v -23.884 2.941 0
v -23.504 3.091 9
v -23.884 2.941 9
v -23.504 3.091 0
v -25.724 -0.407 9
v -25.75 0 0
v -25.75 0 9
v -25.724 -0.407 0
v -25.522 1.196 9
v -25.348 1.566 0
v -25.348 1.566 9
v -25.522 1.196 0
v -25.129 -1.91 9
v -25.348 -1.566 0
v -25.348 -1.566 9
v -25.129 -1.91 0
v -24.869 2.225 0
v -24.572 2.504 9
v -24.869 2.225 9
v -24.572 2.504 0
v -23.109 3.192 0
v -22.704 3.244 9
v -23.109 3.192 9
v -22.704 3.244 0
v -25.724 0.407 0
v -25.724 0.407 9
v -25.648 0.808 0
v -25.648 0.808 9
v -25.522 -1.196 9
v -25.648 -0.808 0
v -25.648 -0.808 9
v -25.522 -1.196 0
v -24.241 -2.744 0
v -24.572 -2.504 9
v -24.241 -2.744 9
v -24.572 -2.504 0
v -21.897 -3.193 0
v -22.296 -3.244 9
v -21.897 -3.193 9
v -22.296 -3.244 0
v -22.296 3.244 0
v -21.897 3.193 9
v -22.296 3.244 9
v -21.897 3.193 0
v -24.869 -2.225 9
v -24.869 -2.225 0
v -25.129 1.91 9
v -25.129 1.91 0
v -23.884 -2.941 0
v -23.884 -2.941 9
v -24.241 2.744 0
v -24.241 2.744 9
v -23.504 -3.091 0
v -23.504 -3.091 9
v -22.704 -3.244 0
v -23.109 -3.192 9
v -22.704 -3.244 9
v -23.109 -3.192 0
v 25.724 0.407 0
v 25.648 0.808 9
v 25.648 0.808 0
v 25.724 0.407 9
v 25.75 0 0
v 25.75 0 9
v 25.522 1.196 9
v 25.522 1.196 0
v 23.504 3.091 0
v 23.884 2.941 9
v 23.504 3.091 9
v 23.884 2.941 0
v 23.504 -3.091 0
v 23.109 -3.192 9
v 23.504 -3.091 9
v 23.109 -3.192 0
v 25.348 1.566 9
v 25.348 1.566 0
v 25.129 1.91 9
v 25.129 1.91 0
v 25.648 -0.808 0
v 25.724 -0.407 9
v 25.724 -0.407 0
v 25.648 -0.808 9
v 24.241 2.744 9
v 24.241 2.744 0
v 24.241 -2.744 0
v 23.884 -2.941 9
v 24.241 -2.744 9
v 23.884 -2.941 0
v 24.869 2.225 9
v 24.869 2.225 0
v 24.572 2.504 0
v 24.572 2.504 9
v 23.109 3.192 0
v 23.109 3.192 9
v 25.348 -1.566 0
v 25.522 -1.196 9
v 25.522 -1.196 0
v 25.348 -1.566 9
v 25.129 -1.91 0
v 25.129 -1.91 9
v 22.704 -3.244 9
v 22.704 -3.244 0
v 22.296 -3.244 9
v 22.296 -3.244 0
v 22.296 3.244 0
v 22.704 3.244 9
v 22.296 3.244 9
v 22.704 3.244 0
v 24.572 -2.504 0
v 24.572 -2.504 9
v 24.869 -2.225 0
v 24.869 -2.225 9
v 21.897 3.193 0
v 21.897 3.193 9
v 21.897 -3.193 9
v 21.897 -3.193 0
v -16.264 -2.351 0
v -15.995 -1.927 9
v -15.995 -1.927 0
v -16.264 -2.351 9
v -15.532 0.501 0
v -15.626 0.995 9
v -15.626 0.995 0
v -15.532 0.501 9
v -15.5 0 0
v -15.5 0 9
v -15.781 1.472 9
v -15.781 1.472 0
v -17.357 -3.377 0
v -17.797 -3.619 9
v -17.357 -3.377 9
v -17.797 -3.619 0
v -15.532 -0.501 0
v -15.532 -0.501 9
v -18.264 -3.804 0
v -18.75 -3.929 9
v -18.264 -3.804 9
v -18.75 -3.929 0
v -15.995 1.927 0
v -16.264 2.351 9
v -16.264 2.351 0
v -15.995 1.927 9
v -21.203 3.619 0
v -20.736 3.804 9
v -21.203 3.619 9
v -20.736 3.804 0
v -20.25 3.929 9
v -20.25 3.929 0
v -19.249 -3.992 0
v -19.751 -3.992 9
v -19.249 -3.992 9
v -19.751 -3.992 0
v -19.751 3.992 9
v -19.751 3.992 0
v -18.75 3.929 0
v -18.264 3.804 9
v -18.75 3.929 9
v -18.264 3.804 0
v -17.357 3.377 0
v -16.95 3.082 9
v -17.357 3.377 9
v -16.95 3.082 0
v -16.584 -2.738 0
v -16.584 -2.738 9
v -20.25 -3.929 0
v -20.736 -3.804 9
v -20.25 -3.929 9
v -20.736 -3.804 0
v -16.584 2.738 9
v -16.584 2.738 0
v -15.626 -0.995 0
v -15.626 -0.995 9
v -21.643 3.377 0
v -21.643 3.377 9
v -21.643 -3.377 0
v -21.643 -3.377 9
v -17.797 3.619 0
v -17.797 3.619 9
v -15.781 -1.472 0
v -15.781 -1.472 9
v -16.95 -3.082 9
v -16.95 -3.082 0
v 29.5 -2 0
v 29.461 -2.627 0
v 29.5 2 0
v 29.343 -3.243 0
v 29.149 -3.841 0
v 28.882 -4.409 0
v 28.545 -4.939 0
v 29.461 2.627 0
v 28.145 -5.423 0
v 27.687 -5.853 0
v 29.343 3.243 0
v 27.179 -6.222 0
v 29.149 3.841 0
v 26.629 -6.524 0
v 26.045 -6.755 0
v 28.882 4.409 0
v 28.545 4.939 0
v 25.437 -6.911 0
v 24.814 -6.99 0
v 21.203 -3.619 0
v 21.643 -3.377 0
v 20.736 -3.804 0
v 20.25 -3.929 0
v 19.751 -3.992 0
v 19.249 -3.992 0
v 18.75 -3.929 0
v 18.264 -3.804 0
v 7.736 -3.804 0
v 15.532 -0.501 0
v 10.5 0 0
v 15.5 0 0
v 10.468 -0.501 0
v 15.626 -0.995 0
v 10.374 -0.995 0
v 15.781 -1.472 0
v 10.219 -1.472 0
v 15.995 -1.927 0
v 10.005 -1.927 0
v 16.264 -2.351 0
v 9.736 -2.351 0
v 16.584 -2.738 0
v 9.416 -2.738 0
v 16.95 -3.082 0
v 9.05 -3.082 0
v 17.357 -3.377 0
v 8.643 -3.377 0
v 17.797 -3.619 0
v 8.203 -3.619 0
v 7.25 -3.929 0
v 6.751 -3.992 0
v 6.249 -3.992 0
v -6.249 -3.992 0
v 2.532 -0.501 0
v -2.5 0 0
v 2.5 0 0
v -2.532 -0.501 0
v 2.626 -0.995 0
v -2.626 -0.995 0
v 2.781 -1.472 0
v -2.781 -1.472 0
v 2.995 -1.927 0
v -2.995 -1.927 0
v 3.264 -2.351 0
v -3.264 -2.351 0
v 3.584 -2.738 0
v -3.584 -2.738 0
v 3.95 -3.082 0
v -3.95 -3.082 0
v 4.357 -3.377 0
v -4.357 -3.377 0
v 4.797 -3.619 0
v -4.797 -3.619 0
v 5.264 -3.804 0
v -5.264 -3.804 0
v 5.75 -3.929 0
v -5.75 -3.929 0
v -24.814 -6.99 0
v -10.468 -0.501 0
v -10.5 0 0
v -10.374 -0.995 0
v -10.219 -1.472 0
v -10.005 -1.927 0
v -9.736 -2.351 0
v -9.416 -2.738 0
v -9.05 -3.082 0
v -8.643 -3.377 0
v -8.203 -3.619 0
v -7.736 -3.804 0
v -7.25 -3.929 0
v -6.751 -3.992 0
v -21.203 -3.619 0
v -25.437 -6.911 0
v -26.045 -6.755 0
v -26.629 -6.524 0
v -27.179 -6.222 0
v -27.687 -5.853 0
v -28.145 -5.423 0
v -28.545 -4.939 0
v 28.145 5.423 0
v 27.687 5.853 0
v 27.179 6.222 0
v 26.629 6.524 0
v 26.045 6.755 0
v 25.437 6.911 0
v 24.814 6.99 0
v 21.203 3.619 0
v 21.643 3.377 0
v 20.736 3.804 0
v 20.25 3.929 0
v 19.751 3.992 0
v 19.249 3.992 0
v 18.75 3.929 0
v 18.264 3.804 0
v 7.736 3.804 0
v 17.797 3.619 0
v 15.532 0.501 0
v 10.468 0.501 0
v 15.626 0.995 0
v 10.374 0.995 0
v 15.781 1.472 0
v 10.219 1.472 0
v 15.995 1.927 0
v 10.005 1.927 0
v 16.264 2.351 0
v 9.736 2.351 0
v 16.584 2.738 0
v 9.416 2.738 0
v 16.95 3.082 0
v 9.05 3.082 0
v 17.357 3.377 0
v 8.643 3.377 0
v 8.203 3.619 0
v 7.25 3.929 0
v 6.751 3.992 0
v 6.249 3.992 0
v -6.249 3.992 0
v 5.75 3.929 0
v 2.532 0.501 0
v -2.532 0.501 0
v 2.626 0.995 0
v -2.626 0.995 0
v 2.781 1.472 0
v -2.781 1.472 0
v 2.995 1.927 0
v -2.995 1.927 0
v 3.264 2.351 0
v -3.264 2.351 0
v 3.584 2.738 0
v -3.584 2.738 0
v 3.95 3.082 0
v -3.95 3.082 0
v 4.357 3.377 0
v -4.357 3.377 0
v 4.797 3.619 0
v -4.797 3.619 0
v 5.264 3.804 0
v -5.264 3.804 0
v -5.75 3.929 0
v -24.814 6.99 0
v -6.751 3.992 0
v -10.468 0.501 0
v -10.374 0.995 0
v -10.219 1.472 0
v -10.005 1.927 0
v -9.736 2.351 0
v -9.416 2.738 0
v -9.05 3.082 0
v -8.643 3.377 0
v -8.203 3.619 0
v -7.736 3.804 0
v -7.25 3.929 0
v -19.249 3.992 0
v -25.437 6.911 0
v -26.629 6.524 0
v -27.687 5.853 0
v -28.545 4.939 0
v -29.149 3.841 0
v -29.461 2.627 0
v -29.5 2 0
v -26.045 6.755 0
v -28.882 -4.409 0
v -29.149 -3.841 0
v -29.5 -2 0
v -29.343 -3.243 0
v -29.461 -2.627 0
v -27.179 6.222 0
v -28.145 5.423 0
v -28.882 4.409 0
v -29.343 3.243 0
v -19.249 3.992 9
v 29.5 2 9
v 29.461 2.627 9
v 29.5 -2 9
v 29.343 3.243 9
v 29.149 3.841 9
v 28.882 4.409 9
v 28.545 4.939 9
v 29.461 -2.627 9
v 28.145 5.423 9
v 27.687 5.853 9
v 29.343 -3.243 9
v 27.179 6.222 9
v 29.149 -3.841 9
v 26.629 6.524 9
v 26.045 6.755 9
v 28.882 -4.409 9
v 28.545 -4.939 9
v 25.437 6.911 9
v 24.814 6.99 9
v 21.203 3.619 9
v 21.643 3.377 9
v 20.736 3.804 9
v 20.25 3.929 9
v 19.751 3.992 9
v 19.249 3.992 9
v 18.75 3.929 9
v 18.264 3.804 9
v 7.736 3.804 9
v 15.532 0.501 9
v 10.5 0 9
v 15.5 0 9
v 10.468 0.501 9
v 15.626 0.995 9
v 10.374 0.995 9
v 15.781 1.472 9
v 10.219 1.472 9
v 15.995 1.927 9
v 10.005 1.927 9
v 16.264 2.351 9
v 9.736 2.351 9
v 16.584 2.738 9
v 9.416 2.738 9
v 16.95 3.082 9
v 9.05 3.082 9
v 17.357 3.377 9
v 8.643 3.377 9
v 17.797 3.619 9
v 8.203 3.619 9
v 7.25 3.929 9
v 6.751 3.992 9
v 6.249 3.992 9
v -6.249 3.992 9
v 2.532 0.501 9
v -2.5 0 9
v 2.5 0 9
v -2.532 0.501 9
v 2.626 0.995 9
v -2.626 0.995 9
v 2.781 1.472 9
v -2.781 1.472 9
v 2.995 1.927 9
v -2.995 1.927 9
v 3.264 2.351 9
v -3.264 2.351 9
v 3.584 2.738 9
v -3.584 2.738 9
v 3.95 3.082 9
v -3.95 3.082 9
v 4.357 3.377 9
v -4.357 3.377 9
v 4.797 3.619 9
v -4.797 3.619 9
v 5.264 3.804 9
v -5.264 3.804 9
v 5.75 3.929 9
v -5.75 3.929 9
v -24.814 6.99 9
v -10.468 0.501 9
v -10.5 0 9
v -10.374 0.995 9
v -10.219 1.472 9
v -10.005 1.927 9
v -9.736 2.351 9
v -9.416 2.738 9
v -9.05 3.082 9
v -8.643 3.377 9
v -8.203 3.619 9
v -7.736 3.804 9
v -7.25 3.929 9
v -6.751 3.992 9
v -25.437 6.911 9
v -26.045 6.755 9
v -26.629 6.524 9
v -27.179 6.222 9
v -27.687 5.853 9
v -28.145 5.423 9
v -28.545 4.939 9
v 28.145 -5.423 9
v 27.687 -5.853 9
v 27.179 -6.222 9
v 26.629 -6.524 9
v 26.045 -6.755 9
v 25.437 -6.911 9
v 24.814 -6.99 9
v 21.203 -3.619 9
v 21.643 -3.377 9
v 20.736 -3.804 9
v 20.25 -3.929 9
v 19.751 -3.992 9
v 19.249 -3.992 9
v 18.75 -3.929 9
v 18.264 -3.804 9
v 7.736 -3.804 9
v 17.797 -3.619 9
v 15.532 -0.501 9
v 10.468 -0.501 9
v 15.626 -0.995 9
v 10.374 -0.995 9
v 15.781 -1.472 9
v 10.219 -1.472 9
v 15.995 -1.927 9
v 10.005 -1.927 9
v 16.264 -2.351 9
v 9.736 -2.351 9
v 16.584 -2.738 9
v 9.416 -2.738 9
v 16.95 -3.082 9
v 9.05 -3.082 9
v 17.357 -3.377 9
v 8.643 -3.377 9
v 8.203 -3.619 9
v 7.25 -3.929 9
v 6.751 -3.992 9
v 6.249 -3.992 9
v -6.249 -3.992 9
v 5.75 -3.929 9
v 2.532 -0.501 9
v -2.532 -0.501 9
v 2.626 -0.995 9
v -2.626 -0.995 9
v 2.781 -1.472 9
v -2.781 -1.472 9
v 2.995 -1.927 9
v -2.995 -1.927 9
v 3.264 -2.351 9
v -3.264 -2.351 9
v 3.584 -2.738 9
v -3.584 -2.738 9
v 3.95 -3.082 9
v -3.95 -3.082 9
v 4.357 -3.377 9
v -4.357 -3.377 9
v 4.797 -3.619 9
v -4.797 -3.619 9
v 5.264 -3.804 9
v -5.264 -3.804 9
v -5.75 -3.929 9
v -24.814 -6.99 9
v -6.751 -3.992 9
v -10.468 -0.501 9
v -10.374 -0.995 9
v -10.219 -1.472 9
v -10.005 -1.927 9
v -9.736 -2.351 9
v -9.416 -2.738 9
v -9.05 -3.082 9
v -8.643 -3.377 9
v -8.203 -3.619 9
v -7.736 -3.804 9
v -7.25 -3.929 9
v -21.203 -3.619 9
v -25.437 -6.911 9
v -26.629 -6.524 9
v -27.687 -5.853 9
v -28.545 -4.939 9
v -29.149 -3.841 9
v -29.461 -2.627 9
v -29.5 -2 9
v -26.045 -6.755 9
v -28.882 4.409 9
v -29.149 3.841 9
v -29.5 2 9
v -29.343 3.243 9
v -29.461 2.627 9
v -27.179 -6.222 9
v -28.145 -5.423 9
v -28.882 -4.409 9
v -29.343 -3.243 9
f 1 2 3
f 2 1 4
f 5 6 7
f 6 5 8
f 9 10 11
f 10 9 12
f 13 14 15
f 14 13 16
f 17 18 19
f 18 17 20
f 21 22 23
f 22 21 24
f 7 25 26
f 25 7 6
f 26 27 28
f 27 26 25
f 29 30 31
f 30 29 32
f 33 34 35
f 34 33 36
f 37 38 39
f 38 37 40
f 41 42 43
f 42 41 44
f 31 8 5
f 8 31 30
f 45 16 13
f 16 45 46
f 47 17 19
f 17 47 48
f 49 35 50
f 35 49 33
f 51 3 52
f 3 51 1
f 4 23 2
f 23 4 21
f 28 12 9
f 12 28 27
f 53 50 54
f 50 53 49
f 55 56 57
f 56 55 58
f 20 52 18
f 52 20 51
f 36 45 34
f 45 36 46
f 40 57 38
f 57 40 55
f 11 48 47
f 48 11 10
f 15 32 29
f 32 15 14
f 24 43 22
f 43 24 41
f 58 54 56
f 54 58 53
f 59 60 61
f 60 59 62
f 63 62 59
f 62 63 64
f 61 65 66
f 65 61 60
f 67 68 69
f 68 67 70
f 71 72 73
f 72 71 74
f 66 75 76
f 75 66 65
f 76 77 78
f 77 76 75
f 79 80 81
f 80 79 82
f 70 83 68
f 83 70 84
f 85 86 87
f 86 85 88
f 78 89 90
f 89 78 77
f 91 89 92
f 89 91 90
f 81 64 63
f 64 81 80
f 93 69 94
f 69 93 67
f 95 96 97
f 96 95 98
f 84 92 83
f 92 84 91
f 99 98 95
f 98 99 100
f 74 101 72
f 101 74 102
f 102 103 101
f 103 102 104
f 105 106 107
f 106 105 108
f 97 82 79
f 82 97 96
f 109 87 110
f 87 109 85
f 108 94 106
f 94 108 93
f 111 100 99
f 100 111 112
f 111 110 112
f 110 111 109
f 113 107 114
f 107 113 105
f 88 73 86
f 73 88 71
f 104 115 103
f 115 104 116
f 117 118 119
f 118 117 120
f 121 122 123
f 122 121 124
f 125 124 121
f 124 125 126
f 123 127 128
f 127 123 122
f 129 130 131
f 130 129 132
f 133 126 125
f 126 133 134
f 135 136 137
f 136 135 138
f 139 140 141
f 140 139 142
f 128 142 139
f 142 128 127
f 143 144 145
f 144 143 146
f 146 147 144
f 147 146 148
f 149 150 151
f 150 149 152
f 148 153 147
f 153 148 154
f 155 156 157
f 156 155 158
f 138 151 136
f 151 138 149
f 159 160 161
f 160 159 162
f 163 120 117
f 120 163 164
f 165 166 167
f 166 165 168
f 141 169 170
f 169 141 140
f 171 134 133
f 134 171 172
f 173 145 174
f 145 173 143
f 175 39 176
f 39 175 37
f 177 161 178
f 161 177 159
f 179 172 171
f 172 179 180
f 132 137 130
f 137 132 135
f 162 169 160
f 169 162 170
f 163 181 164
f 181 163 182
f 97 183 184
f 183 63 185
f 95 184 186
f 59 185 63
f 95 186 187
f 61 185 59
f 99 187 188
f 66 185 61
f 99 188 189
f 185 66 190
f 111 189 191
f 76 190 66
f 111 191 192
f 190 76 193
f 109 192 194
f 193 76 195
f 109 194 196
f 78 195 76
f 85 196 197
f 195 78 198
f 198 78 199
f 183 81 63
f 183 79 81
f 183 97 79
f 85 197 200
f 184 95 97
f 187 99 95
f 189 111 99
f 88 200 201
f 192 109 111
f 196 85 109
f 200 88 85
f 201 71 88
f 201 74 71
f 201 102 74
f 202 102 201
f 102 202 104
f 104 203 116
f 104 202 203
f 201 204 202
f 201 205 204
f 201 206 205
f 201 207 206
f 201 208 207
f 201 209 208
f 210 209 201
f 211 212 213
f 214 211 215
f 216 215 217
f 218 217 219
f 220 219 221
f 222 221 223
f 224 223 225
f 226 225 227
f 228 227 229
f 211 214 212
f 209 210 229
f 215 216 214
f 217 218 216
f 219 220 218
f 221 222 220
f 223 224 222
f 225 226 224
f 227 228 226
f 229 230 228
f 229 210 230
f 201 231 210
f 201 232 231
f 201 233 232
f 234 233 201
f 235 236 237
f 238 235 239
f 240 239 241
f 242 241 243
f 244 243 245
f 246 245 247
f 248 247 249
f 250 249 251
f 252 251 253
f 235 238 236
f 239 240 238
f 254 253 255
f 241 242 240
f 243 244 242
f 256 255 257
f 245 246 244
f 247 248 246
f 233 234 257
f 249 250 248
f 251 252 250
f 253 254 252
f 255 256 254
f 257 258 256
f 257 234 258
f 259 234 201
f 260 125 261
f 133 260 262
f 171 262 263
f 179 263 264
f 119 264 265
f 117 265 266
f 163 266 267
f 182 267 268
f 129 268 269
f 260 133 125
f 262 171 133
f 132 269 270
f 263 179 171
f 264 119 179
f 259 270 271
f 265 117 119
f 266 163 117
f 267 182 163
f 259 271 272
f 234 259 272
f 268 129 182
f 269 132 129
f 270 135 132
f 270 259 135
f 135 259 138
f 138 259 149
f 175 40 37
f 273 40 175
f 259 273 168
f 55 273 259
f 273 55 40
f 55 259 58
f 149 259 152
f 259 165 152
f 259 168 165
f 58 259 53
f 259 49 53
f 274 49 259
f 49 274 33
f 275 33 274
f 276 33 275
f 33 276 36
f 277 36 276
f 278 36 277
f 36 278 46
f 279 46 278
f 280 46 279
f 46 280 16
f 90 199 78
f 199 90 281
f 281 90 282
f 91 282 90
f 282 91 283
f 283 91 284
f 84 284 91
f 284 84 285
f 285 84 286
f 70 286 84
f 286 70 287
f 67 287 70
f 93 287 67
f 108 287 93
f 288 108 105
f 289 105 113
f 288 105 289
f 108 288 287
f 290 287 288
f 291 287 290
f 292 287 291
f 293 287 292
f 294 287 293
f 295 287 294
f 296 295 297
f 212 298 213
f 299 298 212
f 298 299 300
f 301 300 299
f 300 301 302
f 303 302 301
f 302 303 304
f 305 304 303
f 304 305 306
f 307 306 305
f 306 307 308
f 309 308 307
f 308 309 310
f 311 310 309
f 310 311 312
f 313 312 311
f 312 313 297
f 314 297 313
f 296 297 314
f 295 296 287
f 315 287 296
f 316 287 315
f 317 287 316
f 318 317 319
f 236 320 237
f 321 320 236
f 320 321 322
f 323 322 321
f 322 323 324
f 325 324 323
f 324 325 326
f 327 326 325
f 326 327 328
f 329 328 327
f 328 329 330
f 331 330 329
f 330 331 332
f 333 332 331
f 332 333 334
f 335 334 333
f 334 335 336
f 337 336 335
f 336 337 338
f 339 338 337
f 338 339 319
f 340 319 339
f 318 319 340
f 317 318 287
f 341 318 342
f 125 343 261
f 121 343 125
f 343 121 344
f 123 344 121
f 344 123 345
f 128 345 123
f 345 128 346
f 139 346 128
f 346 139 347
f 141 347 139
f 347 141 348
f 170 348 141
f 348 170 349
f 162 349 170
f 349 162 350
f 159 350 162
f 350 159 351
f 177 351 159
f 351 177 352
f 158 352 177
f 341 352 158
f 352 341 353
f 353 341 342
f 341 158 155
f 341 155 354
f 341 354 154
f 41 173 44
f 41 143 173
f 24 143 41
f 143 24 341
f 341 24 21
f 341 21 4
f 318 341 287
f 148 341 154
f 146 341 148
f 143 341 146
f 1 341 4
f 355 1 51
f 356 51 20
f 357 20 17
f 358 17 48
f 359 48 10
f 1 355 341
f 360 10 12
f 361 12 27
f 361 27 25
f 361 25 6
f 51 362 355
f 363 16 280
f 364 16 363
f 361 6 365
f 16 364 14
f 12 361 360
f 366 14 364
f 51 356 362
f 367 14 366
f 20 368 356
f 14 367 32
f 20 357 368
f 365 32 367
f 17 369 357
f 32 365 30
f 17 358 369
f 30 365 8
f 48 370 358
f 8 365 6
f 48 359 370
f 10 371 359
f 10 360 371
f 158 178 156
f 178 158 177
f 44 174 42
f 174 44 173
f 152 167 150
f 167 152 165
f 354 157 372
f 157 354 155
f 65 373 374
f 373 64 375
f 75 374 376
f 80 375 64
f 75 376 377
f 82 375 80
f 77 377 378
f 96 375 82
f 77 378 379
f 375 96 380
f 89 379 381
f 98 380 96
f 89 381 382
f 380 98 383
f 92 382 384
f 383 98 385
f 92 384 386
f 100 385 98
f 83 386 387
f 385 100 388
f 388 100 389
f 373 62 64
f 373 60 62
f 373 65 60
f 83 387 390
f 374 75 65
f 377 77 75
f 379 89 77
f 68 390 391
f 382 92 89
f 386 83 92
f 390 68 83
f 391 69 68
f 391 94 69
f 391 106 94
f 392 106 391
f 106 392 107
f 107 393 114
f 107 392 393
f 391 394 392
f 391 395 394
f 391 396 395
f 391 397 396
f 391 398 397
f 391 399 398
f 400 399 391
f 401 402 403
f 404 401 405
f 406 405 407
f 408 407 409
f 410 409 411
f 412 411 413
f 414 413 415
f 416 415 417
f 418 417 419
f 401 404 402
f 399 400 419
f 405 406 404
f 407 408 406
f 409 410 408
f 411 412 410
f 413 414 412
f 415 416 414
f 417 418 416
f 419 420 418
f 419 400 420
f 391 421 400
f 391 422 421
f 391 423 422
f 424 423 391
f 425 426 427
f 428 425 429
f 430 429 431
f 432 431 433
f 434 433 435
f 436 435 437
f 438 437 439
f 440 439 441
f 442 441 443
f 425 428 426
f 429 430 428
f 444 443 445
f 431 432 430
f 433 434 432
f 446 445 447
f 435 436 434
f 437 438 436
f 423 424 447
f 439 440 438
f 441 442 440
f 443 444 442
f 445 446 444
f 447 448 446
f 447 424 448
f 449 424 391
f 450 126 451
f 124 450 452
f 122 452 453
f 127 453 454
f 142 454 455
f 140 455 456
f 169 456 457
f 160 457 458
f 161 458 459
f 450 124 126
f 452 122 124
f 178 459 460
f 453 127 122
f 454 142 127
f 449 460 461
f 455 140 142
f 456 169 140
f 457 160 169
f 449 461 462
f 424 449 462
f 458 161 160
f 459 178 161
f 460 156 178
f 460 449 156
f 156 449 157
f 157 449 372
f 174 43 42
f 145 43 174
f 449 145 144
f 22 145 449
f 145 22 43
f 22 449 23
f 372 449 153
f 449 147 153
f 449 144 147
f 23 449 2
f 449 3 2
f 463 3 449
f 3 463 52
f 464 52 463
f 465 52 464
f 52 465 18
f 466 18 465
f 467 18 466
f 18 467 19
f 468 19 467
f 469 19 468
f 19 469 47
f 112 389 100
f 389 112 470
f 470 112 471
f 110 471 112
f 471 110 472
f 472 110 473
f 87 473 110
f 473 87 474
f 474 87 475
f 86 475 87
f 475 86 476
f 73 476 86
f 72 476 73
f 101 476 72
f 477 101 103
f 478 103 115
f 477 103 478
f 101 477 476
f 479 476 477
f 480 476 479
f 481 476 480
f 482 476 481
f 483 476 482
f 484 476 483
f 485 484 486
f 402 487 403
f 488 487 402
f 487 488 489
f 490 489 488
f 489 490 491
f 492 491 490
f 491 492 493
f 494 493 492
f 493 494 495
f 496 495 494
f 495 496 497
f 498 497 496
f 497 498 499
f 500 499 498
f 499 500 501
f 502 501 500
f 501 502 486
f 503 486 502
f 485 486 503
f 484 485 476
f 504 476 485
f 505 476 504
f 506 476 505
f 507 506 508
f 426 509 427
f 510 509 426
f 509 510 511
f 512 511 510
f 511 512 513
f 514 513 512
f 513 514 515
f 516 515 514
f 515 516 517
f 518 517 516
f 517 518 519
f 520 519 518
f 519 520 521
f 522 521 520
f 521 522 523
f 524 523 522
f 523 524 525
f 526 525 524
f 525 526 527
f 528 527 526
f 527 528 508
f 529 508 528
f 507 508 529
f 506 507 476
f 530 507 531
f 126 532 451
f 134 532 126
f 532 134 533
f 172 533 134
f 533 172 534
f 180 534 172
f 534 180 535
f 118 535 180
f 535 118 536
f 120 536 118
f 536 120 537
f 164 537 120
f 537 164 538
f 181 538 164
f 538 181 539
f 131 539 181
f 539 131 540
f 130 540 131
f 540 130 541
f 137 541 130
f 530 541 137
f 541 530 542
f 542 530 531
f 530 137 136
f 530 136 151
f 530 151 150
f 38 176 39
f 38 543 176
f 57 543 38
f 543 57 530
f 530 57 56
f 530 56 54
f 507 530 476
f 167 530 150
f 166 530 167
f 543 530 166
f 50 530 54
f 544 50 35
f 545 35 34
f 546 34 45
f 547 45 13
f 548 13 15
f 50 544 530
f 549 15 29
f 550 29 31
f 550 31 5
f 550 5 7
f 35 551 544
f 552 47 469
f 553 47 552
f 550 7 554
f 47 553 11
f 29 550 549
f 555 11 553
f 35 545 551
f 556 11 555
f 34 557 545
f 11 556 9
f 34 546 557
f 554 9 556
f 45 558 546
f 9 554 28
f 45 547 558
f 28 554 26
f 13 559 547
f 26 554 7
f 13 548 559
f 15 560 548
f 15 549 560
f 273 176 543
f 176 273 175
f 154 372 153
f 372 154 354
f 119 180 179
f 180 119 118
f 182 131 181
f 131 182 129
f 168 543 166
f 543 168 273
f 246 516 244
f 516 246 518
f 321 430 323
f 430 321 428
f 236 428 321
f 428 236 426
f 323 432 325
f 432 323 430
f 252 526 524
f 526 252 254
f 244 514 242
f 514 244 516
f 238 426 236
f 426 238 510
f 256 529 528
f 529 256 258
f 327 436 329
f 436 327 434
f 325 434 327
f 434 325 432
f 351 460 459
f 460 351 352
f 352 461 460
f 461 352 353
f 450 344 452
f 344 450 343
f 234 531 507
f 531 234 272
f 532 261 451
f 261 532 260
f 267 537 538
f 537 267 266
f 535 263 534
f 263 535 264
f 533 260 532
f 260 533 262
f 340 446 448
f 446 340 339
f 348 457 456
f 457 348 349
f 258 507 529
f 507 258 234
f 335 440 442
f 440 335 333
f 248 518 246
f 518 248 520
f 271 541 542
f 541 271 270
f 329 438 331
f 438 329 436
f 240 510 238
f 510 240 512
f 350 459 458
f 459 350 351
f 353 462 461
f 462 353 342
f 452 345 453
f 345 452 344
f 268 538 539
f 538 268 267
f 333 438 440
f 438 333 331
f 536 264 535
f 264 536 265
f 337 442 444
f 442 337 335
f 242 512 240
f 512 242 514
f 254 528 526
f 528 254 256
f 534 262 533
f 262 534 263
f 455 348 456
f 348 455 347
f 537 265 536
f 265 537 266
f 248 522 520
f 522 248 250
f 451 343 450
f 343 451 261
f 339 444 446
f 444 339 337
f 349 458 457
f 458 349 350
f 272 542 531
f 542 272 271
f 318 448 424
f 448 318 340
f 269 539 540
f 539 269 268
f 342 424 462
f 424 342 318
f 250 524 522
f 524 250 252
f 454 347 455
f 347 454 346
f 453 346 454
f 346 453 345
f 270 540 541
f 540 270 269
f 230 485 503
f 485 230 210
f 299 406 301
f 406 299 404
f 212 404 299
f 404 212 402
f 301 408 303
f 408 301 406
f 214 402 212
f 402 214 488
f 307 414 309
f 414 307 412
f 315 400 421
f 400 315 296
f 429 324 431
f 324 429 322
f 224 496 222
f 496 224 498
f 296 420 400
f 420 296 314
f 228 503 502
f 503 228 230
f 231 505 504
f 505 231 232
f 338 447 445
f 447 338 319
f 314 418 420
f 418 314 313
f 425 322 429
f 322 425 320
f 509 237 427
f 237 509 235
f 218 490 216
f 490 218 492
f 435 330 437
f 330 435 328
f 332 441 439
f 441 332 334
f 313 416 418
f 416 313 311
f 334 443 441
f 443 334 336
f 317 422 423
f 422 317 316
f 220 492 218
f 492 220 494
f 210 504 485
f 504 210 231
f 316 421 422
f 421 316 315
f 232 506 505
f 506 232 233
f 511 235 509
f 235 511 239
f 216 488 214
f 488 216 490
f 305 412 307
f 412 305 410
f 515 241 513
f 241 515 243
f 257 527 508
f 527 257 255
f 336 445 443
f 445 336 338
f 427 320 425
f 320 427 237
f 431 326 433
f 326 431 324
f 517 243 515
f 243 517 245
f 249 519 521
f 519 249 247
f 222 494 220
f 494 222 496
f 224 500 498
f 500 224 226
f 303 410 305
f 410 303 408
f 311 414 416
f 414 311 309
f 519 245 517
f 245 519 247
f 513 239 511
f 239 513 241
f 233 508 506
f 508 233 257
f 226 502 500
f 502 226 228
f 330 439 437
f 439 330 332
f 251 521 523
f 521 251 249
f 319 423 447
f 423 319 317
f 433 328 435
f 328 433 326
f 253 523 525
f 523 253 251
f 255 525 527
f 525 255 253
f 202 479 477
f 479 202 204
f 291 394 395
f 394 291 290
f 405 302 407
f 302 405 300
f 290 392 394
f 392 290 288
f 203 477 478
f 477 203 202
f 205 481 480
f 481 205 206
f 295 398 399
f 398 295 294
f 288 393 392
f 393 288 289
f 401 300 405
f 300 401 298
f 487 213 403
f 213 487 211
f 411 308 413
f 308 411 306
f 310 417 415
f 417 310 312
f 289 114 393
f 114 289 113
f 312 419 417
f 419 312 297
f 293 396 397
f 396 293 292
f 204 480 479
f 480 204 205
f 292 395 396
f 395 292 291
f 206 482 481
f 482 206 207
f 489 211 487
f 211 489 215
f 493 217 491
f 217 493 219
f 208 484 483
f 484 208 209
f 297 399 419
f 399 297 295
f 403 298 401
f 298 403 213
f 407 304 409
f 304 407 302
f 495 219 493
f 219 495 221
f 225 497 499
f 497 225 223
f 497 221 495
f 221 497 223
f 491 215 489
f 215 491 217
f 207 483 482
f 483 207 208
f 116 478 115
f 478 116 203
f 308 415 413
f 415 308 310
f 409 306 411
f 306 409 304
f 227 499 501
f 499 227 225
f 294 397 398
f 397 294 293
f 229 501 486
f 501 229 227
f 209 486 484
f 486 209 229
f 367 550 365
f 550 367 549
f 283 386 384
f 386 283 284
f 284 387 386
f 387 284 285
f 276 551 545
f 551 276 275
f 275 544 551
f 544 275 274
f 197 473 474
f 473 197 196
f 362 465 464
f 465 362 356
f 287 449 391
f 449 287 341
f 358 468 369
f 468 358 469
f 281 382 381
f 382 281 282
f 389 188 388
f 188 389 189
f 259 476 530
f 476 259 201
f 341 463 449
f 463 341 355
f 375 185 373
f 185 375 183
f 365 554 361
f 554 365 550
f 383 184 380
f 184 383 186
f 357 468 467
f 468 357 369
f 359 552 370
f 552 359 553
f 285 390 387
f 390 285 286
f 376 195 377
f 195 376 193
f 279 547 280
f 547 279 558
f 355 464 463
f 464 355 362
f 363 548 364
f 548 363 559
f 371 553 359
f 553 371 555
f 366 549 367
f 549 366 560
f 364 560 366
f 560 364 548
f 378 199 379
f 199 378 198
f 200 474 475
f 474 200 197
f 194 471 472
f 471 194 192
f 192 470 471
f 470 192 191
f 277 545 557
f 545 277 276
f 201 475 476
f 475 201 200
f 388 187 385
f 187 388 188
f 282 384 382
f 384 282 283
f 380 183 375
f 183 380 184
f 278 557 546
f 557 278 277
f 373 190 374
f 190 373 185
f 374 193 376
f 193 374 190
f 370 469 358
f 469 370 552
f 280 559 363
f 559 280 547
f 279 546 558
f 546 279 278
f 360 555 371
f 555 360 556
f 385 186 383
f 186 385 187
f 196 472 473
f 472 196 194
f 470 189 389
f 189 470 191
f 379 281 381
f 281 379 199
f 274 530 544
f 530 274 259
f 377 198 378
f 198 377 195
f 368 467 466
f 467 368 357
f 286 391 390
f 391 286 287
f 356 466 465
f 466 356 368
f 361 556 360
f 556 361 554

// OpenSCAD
$fn = 50;

difference() {
	union() {
		hull() {
			translate(v = [-24.5, 2.0, 0]) {
				cylinder(h = 9, r = 5);
			}
			translate(v = [24.5, 2.0, 0]) {
				cylinder(h = 9, r = 5);
			}
			translate(v = [-24.5, -2.0, 0]) {
				cylinder(h = 9, r = 5);
			}
			translate(v = [24.5, -2.0, 0]) {
				cylinder(h = 9, r = 5);
			}
		}
	}
	union() {
		translate(v = [-22.5, 0.0, -100.0]) {
			cylinder(h = 200, r = 3.25);
		}
		translate(v = [22.5, 0.0, -100.0]) {
			cylinder(h = 200, r = 3.25);
		}
		translate(v = [-22.5, 0.0, -100.0]) {
			cylinder(h = 200, r = 1.8);
		}
		translate(v = [22.5, 0.0, -100.0]) {
			cylinder(h = 200, r = 1.8);
		}
		translate(v = [-19.5, 0, 0.0]) {
			cylinder(h = 9, r = 4.0);
		}
		translate(v = [-6.5, 0, 0.0]) {
			cylinder(h = 9, r = 4.0);
		}
		translate(v = [6.5, 0, 0.0]) {
			cylinder(h = 9, r = 4.0);
		}
		translate(v = [19.5, 0, 0.0]) {
			cylinder(h = 9, r = 4.0);
		}
	}
}
